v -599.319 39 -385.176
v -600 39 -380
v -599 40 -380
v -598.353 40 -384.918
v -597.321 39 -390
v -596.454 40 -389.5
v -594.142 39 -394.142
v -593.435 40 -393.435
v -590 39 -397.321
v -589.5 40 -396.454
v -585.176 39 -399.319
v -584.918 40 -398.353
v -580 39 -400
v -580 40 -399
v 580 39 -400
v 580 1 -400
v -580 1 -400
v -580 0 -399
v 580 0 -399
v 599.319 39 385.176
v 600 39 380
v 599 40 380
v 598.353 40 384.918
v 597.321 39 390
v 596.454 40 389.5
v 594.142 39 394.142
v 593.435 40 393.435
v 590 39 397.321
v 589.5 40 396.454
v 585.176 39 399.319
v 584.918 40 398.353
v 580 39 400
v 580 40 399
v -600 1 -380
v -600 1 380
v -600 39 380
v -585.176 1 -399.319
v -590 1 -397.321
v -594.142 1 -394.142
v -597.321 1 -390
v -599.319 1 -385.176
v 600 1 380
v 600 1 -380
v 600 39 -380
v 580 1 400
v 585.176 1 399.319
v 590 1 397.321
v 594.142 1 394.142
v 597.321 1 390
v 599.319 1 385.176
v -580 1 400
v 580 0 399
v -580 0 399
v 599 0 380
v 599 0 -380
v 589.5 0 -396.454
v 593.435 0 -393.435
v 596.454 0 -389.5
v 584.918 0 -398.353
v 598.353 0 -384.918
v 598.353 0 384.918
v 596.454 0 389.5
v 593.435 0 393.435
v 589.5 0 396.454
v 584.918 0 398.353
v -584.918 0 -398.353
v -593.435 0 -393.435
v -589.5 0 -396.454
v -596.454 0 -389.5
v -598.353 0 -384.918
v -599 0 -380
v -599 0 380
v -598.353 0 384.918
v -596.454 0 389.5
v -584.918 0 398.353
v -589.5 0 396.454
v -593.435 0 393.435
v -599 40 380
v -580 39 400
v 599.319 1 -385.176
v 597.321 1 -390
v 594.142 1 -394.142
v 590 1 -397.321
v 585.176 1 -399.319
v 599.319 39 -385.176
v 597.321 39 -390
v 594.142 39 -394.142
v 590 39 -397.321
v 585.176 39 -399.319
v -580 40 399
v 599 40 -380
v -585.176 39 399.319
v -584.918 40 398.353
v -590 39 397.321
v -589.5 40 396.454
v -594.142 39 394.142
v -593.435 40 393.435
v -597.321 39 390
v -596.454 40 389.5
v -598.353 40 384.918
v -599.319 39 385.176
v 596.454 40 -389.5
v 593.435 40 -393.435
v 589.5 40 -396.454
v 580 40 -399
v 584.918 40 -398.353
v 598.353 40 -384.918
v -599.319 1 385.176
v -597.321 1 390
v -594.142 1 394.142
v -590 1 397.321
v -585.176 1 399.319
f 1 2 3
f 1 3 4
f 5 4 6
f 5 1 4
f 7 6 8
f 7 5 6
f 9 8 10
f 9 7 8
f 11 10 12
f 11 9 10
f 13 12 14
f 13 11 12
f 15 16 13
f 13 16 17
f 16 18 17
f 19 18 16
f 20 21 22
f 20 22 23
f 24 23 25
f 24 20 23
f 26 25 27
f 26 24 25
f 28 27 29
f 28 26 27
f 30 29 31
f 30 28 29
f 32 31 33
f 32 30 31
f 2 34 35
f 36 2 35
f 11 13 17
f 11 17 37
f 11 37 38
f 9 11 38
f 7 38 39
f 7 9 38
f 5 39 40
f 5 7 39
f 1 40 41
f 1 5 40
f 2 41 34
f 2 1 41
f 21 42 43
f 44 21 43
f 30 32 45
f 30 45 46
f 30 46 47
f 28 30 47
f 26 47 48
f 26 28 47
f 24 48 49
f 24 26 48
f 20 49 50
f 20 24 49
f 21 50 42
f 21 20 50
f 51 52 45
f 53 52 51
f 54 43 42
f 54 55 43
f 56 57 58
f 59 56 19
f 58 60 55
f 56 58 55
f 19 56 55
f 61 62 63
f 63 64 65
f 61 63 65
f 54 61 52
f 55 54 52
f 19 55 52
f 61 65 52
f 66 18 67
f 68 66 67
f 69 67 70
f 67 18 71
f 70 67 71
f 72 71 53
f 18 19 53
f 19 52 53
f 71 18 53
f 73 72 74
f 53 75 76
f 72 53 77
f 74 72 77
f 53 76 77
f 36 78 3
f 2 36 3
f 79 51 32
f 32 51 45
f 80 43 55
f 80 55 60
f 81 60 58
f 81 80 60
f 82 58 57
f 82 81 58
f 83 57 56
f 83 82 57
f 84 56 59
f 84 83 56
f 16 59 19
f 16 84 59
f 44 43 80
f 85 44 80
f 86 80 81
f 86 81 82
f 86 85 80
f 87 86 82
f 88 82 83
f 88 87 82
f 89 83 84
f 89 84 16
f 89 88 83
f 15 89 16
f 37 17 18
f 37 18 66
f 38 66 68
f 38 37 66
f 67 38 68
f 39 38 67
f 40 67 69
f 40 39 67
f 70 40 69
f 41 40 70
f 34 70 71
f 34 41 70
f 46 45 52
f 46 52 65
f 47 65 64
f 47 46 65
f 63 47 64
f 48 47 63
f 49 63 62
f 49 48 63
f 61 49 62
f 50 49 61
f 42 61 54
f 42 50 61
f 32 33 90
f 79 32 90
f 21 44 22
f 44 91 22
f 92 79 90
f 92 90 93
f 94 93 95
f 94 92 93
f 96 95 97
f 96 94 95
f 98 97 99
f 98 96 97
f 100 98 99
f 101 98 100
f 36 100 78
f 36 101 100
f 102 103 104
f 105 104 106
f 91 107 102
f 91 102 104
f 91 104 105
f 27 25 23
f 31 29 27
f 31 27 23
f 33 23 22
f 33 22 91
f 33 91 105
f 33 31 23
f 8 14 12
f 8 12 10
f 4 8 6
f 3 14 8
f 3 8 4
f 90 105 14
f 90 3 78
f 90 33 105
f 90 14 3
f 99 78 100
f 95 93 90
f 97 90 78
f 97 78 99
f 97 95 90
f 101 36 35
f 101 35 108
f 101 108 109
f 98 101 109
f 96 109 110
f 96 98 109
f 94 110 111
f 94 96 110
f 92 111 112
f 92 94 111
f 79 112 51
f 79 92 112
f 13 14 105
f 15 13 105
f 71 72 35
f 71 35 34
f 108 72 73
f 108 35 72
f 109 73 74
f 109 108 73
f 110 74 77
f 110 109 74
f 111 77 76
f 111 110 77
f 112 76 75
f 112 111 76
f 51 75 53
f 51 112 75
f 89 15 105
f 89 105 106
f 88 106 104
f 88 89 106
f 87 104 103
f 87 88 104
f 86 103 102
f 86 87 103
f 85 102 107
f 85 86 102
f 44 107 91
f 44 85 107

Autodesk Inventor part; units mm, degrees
ref_plane "YZ Plane" through (0, 0, 0) normal (1, 0, 0) x (0, 1, 0)
ref_plane "XZ Plane" through (0, 0, 0) normal (0, 1, 0) x (-1, 0, 0)
ref_plane "XY Plane" through (0, 0, 0) normal (0, 0, 1) x (1, 0, 0)
sketch "Sketch1" plane through (0, 0, 0) normal (0, 1, 0) x (-1, 0, 0)
  line L0 (-600, -400) -> (600, -400)
  line L1 (600, -400) -> (600, 400)
  line L2 (600, 400) -> (-600, 400)
  line L3 (-600, 400) -> (-600, -400)
  line L4 (-600, -400) -> (600, 400) construction
  line L5 (600, -400) -> (-600, 400) construction
  point P0 (0, 0)
  dimension "height" = 1200
  dimension "width" = 800
extrude "Extrusion1" add sketch "Sketch1" along normal blind 40
fillet "Fillet1" radius 20 4 edges at (600, 20, -400) (600, 20, 400) (-600, 20, 400) (-600, 20, -400)
chamfer "Chamfer3" distance 1 angle 45 16 edges at (600, 0, 0) (594.1421, 0, -394.1421) (0, 0, -400) (-594.1421, 0, -394.1421) (-600, 0, 0) (-594.1421, 0, 394.1421) (0, 0, 400) (594.1421, 0, 394.1421) (600, 40, 0) (594.1421, 40, -394.1421) (0, 40, -400) (-594.1421, 40, -394.1421) (-600, 40, 0) (-594.1421, 40, 394.1421) (0, 40, 400) (594.1421, 40, 394.1421)
sketch "Sketch2" plane through (0, 40, 0) normal (0, 1, 0) x (1, 0, 0)
  point P0 (0, 0)
equation "\"height\" = height_user"
equation "\"width\" = width_user"
equation "\"thickness\" = thickness_user"
equation "\"radius\" = radius_user"
equation "\"chamfer\" = chamfer_user"
equation "\"height_user\" = 1200"
equation "\"width_user\" = 800"
equation "\"thickness_user\" = 40"
equation "\"chamfer_user\" = 1"
equation "\"radius_user\" = 20"
properties part number "readDataFromDB"
